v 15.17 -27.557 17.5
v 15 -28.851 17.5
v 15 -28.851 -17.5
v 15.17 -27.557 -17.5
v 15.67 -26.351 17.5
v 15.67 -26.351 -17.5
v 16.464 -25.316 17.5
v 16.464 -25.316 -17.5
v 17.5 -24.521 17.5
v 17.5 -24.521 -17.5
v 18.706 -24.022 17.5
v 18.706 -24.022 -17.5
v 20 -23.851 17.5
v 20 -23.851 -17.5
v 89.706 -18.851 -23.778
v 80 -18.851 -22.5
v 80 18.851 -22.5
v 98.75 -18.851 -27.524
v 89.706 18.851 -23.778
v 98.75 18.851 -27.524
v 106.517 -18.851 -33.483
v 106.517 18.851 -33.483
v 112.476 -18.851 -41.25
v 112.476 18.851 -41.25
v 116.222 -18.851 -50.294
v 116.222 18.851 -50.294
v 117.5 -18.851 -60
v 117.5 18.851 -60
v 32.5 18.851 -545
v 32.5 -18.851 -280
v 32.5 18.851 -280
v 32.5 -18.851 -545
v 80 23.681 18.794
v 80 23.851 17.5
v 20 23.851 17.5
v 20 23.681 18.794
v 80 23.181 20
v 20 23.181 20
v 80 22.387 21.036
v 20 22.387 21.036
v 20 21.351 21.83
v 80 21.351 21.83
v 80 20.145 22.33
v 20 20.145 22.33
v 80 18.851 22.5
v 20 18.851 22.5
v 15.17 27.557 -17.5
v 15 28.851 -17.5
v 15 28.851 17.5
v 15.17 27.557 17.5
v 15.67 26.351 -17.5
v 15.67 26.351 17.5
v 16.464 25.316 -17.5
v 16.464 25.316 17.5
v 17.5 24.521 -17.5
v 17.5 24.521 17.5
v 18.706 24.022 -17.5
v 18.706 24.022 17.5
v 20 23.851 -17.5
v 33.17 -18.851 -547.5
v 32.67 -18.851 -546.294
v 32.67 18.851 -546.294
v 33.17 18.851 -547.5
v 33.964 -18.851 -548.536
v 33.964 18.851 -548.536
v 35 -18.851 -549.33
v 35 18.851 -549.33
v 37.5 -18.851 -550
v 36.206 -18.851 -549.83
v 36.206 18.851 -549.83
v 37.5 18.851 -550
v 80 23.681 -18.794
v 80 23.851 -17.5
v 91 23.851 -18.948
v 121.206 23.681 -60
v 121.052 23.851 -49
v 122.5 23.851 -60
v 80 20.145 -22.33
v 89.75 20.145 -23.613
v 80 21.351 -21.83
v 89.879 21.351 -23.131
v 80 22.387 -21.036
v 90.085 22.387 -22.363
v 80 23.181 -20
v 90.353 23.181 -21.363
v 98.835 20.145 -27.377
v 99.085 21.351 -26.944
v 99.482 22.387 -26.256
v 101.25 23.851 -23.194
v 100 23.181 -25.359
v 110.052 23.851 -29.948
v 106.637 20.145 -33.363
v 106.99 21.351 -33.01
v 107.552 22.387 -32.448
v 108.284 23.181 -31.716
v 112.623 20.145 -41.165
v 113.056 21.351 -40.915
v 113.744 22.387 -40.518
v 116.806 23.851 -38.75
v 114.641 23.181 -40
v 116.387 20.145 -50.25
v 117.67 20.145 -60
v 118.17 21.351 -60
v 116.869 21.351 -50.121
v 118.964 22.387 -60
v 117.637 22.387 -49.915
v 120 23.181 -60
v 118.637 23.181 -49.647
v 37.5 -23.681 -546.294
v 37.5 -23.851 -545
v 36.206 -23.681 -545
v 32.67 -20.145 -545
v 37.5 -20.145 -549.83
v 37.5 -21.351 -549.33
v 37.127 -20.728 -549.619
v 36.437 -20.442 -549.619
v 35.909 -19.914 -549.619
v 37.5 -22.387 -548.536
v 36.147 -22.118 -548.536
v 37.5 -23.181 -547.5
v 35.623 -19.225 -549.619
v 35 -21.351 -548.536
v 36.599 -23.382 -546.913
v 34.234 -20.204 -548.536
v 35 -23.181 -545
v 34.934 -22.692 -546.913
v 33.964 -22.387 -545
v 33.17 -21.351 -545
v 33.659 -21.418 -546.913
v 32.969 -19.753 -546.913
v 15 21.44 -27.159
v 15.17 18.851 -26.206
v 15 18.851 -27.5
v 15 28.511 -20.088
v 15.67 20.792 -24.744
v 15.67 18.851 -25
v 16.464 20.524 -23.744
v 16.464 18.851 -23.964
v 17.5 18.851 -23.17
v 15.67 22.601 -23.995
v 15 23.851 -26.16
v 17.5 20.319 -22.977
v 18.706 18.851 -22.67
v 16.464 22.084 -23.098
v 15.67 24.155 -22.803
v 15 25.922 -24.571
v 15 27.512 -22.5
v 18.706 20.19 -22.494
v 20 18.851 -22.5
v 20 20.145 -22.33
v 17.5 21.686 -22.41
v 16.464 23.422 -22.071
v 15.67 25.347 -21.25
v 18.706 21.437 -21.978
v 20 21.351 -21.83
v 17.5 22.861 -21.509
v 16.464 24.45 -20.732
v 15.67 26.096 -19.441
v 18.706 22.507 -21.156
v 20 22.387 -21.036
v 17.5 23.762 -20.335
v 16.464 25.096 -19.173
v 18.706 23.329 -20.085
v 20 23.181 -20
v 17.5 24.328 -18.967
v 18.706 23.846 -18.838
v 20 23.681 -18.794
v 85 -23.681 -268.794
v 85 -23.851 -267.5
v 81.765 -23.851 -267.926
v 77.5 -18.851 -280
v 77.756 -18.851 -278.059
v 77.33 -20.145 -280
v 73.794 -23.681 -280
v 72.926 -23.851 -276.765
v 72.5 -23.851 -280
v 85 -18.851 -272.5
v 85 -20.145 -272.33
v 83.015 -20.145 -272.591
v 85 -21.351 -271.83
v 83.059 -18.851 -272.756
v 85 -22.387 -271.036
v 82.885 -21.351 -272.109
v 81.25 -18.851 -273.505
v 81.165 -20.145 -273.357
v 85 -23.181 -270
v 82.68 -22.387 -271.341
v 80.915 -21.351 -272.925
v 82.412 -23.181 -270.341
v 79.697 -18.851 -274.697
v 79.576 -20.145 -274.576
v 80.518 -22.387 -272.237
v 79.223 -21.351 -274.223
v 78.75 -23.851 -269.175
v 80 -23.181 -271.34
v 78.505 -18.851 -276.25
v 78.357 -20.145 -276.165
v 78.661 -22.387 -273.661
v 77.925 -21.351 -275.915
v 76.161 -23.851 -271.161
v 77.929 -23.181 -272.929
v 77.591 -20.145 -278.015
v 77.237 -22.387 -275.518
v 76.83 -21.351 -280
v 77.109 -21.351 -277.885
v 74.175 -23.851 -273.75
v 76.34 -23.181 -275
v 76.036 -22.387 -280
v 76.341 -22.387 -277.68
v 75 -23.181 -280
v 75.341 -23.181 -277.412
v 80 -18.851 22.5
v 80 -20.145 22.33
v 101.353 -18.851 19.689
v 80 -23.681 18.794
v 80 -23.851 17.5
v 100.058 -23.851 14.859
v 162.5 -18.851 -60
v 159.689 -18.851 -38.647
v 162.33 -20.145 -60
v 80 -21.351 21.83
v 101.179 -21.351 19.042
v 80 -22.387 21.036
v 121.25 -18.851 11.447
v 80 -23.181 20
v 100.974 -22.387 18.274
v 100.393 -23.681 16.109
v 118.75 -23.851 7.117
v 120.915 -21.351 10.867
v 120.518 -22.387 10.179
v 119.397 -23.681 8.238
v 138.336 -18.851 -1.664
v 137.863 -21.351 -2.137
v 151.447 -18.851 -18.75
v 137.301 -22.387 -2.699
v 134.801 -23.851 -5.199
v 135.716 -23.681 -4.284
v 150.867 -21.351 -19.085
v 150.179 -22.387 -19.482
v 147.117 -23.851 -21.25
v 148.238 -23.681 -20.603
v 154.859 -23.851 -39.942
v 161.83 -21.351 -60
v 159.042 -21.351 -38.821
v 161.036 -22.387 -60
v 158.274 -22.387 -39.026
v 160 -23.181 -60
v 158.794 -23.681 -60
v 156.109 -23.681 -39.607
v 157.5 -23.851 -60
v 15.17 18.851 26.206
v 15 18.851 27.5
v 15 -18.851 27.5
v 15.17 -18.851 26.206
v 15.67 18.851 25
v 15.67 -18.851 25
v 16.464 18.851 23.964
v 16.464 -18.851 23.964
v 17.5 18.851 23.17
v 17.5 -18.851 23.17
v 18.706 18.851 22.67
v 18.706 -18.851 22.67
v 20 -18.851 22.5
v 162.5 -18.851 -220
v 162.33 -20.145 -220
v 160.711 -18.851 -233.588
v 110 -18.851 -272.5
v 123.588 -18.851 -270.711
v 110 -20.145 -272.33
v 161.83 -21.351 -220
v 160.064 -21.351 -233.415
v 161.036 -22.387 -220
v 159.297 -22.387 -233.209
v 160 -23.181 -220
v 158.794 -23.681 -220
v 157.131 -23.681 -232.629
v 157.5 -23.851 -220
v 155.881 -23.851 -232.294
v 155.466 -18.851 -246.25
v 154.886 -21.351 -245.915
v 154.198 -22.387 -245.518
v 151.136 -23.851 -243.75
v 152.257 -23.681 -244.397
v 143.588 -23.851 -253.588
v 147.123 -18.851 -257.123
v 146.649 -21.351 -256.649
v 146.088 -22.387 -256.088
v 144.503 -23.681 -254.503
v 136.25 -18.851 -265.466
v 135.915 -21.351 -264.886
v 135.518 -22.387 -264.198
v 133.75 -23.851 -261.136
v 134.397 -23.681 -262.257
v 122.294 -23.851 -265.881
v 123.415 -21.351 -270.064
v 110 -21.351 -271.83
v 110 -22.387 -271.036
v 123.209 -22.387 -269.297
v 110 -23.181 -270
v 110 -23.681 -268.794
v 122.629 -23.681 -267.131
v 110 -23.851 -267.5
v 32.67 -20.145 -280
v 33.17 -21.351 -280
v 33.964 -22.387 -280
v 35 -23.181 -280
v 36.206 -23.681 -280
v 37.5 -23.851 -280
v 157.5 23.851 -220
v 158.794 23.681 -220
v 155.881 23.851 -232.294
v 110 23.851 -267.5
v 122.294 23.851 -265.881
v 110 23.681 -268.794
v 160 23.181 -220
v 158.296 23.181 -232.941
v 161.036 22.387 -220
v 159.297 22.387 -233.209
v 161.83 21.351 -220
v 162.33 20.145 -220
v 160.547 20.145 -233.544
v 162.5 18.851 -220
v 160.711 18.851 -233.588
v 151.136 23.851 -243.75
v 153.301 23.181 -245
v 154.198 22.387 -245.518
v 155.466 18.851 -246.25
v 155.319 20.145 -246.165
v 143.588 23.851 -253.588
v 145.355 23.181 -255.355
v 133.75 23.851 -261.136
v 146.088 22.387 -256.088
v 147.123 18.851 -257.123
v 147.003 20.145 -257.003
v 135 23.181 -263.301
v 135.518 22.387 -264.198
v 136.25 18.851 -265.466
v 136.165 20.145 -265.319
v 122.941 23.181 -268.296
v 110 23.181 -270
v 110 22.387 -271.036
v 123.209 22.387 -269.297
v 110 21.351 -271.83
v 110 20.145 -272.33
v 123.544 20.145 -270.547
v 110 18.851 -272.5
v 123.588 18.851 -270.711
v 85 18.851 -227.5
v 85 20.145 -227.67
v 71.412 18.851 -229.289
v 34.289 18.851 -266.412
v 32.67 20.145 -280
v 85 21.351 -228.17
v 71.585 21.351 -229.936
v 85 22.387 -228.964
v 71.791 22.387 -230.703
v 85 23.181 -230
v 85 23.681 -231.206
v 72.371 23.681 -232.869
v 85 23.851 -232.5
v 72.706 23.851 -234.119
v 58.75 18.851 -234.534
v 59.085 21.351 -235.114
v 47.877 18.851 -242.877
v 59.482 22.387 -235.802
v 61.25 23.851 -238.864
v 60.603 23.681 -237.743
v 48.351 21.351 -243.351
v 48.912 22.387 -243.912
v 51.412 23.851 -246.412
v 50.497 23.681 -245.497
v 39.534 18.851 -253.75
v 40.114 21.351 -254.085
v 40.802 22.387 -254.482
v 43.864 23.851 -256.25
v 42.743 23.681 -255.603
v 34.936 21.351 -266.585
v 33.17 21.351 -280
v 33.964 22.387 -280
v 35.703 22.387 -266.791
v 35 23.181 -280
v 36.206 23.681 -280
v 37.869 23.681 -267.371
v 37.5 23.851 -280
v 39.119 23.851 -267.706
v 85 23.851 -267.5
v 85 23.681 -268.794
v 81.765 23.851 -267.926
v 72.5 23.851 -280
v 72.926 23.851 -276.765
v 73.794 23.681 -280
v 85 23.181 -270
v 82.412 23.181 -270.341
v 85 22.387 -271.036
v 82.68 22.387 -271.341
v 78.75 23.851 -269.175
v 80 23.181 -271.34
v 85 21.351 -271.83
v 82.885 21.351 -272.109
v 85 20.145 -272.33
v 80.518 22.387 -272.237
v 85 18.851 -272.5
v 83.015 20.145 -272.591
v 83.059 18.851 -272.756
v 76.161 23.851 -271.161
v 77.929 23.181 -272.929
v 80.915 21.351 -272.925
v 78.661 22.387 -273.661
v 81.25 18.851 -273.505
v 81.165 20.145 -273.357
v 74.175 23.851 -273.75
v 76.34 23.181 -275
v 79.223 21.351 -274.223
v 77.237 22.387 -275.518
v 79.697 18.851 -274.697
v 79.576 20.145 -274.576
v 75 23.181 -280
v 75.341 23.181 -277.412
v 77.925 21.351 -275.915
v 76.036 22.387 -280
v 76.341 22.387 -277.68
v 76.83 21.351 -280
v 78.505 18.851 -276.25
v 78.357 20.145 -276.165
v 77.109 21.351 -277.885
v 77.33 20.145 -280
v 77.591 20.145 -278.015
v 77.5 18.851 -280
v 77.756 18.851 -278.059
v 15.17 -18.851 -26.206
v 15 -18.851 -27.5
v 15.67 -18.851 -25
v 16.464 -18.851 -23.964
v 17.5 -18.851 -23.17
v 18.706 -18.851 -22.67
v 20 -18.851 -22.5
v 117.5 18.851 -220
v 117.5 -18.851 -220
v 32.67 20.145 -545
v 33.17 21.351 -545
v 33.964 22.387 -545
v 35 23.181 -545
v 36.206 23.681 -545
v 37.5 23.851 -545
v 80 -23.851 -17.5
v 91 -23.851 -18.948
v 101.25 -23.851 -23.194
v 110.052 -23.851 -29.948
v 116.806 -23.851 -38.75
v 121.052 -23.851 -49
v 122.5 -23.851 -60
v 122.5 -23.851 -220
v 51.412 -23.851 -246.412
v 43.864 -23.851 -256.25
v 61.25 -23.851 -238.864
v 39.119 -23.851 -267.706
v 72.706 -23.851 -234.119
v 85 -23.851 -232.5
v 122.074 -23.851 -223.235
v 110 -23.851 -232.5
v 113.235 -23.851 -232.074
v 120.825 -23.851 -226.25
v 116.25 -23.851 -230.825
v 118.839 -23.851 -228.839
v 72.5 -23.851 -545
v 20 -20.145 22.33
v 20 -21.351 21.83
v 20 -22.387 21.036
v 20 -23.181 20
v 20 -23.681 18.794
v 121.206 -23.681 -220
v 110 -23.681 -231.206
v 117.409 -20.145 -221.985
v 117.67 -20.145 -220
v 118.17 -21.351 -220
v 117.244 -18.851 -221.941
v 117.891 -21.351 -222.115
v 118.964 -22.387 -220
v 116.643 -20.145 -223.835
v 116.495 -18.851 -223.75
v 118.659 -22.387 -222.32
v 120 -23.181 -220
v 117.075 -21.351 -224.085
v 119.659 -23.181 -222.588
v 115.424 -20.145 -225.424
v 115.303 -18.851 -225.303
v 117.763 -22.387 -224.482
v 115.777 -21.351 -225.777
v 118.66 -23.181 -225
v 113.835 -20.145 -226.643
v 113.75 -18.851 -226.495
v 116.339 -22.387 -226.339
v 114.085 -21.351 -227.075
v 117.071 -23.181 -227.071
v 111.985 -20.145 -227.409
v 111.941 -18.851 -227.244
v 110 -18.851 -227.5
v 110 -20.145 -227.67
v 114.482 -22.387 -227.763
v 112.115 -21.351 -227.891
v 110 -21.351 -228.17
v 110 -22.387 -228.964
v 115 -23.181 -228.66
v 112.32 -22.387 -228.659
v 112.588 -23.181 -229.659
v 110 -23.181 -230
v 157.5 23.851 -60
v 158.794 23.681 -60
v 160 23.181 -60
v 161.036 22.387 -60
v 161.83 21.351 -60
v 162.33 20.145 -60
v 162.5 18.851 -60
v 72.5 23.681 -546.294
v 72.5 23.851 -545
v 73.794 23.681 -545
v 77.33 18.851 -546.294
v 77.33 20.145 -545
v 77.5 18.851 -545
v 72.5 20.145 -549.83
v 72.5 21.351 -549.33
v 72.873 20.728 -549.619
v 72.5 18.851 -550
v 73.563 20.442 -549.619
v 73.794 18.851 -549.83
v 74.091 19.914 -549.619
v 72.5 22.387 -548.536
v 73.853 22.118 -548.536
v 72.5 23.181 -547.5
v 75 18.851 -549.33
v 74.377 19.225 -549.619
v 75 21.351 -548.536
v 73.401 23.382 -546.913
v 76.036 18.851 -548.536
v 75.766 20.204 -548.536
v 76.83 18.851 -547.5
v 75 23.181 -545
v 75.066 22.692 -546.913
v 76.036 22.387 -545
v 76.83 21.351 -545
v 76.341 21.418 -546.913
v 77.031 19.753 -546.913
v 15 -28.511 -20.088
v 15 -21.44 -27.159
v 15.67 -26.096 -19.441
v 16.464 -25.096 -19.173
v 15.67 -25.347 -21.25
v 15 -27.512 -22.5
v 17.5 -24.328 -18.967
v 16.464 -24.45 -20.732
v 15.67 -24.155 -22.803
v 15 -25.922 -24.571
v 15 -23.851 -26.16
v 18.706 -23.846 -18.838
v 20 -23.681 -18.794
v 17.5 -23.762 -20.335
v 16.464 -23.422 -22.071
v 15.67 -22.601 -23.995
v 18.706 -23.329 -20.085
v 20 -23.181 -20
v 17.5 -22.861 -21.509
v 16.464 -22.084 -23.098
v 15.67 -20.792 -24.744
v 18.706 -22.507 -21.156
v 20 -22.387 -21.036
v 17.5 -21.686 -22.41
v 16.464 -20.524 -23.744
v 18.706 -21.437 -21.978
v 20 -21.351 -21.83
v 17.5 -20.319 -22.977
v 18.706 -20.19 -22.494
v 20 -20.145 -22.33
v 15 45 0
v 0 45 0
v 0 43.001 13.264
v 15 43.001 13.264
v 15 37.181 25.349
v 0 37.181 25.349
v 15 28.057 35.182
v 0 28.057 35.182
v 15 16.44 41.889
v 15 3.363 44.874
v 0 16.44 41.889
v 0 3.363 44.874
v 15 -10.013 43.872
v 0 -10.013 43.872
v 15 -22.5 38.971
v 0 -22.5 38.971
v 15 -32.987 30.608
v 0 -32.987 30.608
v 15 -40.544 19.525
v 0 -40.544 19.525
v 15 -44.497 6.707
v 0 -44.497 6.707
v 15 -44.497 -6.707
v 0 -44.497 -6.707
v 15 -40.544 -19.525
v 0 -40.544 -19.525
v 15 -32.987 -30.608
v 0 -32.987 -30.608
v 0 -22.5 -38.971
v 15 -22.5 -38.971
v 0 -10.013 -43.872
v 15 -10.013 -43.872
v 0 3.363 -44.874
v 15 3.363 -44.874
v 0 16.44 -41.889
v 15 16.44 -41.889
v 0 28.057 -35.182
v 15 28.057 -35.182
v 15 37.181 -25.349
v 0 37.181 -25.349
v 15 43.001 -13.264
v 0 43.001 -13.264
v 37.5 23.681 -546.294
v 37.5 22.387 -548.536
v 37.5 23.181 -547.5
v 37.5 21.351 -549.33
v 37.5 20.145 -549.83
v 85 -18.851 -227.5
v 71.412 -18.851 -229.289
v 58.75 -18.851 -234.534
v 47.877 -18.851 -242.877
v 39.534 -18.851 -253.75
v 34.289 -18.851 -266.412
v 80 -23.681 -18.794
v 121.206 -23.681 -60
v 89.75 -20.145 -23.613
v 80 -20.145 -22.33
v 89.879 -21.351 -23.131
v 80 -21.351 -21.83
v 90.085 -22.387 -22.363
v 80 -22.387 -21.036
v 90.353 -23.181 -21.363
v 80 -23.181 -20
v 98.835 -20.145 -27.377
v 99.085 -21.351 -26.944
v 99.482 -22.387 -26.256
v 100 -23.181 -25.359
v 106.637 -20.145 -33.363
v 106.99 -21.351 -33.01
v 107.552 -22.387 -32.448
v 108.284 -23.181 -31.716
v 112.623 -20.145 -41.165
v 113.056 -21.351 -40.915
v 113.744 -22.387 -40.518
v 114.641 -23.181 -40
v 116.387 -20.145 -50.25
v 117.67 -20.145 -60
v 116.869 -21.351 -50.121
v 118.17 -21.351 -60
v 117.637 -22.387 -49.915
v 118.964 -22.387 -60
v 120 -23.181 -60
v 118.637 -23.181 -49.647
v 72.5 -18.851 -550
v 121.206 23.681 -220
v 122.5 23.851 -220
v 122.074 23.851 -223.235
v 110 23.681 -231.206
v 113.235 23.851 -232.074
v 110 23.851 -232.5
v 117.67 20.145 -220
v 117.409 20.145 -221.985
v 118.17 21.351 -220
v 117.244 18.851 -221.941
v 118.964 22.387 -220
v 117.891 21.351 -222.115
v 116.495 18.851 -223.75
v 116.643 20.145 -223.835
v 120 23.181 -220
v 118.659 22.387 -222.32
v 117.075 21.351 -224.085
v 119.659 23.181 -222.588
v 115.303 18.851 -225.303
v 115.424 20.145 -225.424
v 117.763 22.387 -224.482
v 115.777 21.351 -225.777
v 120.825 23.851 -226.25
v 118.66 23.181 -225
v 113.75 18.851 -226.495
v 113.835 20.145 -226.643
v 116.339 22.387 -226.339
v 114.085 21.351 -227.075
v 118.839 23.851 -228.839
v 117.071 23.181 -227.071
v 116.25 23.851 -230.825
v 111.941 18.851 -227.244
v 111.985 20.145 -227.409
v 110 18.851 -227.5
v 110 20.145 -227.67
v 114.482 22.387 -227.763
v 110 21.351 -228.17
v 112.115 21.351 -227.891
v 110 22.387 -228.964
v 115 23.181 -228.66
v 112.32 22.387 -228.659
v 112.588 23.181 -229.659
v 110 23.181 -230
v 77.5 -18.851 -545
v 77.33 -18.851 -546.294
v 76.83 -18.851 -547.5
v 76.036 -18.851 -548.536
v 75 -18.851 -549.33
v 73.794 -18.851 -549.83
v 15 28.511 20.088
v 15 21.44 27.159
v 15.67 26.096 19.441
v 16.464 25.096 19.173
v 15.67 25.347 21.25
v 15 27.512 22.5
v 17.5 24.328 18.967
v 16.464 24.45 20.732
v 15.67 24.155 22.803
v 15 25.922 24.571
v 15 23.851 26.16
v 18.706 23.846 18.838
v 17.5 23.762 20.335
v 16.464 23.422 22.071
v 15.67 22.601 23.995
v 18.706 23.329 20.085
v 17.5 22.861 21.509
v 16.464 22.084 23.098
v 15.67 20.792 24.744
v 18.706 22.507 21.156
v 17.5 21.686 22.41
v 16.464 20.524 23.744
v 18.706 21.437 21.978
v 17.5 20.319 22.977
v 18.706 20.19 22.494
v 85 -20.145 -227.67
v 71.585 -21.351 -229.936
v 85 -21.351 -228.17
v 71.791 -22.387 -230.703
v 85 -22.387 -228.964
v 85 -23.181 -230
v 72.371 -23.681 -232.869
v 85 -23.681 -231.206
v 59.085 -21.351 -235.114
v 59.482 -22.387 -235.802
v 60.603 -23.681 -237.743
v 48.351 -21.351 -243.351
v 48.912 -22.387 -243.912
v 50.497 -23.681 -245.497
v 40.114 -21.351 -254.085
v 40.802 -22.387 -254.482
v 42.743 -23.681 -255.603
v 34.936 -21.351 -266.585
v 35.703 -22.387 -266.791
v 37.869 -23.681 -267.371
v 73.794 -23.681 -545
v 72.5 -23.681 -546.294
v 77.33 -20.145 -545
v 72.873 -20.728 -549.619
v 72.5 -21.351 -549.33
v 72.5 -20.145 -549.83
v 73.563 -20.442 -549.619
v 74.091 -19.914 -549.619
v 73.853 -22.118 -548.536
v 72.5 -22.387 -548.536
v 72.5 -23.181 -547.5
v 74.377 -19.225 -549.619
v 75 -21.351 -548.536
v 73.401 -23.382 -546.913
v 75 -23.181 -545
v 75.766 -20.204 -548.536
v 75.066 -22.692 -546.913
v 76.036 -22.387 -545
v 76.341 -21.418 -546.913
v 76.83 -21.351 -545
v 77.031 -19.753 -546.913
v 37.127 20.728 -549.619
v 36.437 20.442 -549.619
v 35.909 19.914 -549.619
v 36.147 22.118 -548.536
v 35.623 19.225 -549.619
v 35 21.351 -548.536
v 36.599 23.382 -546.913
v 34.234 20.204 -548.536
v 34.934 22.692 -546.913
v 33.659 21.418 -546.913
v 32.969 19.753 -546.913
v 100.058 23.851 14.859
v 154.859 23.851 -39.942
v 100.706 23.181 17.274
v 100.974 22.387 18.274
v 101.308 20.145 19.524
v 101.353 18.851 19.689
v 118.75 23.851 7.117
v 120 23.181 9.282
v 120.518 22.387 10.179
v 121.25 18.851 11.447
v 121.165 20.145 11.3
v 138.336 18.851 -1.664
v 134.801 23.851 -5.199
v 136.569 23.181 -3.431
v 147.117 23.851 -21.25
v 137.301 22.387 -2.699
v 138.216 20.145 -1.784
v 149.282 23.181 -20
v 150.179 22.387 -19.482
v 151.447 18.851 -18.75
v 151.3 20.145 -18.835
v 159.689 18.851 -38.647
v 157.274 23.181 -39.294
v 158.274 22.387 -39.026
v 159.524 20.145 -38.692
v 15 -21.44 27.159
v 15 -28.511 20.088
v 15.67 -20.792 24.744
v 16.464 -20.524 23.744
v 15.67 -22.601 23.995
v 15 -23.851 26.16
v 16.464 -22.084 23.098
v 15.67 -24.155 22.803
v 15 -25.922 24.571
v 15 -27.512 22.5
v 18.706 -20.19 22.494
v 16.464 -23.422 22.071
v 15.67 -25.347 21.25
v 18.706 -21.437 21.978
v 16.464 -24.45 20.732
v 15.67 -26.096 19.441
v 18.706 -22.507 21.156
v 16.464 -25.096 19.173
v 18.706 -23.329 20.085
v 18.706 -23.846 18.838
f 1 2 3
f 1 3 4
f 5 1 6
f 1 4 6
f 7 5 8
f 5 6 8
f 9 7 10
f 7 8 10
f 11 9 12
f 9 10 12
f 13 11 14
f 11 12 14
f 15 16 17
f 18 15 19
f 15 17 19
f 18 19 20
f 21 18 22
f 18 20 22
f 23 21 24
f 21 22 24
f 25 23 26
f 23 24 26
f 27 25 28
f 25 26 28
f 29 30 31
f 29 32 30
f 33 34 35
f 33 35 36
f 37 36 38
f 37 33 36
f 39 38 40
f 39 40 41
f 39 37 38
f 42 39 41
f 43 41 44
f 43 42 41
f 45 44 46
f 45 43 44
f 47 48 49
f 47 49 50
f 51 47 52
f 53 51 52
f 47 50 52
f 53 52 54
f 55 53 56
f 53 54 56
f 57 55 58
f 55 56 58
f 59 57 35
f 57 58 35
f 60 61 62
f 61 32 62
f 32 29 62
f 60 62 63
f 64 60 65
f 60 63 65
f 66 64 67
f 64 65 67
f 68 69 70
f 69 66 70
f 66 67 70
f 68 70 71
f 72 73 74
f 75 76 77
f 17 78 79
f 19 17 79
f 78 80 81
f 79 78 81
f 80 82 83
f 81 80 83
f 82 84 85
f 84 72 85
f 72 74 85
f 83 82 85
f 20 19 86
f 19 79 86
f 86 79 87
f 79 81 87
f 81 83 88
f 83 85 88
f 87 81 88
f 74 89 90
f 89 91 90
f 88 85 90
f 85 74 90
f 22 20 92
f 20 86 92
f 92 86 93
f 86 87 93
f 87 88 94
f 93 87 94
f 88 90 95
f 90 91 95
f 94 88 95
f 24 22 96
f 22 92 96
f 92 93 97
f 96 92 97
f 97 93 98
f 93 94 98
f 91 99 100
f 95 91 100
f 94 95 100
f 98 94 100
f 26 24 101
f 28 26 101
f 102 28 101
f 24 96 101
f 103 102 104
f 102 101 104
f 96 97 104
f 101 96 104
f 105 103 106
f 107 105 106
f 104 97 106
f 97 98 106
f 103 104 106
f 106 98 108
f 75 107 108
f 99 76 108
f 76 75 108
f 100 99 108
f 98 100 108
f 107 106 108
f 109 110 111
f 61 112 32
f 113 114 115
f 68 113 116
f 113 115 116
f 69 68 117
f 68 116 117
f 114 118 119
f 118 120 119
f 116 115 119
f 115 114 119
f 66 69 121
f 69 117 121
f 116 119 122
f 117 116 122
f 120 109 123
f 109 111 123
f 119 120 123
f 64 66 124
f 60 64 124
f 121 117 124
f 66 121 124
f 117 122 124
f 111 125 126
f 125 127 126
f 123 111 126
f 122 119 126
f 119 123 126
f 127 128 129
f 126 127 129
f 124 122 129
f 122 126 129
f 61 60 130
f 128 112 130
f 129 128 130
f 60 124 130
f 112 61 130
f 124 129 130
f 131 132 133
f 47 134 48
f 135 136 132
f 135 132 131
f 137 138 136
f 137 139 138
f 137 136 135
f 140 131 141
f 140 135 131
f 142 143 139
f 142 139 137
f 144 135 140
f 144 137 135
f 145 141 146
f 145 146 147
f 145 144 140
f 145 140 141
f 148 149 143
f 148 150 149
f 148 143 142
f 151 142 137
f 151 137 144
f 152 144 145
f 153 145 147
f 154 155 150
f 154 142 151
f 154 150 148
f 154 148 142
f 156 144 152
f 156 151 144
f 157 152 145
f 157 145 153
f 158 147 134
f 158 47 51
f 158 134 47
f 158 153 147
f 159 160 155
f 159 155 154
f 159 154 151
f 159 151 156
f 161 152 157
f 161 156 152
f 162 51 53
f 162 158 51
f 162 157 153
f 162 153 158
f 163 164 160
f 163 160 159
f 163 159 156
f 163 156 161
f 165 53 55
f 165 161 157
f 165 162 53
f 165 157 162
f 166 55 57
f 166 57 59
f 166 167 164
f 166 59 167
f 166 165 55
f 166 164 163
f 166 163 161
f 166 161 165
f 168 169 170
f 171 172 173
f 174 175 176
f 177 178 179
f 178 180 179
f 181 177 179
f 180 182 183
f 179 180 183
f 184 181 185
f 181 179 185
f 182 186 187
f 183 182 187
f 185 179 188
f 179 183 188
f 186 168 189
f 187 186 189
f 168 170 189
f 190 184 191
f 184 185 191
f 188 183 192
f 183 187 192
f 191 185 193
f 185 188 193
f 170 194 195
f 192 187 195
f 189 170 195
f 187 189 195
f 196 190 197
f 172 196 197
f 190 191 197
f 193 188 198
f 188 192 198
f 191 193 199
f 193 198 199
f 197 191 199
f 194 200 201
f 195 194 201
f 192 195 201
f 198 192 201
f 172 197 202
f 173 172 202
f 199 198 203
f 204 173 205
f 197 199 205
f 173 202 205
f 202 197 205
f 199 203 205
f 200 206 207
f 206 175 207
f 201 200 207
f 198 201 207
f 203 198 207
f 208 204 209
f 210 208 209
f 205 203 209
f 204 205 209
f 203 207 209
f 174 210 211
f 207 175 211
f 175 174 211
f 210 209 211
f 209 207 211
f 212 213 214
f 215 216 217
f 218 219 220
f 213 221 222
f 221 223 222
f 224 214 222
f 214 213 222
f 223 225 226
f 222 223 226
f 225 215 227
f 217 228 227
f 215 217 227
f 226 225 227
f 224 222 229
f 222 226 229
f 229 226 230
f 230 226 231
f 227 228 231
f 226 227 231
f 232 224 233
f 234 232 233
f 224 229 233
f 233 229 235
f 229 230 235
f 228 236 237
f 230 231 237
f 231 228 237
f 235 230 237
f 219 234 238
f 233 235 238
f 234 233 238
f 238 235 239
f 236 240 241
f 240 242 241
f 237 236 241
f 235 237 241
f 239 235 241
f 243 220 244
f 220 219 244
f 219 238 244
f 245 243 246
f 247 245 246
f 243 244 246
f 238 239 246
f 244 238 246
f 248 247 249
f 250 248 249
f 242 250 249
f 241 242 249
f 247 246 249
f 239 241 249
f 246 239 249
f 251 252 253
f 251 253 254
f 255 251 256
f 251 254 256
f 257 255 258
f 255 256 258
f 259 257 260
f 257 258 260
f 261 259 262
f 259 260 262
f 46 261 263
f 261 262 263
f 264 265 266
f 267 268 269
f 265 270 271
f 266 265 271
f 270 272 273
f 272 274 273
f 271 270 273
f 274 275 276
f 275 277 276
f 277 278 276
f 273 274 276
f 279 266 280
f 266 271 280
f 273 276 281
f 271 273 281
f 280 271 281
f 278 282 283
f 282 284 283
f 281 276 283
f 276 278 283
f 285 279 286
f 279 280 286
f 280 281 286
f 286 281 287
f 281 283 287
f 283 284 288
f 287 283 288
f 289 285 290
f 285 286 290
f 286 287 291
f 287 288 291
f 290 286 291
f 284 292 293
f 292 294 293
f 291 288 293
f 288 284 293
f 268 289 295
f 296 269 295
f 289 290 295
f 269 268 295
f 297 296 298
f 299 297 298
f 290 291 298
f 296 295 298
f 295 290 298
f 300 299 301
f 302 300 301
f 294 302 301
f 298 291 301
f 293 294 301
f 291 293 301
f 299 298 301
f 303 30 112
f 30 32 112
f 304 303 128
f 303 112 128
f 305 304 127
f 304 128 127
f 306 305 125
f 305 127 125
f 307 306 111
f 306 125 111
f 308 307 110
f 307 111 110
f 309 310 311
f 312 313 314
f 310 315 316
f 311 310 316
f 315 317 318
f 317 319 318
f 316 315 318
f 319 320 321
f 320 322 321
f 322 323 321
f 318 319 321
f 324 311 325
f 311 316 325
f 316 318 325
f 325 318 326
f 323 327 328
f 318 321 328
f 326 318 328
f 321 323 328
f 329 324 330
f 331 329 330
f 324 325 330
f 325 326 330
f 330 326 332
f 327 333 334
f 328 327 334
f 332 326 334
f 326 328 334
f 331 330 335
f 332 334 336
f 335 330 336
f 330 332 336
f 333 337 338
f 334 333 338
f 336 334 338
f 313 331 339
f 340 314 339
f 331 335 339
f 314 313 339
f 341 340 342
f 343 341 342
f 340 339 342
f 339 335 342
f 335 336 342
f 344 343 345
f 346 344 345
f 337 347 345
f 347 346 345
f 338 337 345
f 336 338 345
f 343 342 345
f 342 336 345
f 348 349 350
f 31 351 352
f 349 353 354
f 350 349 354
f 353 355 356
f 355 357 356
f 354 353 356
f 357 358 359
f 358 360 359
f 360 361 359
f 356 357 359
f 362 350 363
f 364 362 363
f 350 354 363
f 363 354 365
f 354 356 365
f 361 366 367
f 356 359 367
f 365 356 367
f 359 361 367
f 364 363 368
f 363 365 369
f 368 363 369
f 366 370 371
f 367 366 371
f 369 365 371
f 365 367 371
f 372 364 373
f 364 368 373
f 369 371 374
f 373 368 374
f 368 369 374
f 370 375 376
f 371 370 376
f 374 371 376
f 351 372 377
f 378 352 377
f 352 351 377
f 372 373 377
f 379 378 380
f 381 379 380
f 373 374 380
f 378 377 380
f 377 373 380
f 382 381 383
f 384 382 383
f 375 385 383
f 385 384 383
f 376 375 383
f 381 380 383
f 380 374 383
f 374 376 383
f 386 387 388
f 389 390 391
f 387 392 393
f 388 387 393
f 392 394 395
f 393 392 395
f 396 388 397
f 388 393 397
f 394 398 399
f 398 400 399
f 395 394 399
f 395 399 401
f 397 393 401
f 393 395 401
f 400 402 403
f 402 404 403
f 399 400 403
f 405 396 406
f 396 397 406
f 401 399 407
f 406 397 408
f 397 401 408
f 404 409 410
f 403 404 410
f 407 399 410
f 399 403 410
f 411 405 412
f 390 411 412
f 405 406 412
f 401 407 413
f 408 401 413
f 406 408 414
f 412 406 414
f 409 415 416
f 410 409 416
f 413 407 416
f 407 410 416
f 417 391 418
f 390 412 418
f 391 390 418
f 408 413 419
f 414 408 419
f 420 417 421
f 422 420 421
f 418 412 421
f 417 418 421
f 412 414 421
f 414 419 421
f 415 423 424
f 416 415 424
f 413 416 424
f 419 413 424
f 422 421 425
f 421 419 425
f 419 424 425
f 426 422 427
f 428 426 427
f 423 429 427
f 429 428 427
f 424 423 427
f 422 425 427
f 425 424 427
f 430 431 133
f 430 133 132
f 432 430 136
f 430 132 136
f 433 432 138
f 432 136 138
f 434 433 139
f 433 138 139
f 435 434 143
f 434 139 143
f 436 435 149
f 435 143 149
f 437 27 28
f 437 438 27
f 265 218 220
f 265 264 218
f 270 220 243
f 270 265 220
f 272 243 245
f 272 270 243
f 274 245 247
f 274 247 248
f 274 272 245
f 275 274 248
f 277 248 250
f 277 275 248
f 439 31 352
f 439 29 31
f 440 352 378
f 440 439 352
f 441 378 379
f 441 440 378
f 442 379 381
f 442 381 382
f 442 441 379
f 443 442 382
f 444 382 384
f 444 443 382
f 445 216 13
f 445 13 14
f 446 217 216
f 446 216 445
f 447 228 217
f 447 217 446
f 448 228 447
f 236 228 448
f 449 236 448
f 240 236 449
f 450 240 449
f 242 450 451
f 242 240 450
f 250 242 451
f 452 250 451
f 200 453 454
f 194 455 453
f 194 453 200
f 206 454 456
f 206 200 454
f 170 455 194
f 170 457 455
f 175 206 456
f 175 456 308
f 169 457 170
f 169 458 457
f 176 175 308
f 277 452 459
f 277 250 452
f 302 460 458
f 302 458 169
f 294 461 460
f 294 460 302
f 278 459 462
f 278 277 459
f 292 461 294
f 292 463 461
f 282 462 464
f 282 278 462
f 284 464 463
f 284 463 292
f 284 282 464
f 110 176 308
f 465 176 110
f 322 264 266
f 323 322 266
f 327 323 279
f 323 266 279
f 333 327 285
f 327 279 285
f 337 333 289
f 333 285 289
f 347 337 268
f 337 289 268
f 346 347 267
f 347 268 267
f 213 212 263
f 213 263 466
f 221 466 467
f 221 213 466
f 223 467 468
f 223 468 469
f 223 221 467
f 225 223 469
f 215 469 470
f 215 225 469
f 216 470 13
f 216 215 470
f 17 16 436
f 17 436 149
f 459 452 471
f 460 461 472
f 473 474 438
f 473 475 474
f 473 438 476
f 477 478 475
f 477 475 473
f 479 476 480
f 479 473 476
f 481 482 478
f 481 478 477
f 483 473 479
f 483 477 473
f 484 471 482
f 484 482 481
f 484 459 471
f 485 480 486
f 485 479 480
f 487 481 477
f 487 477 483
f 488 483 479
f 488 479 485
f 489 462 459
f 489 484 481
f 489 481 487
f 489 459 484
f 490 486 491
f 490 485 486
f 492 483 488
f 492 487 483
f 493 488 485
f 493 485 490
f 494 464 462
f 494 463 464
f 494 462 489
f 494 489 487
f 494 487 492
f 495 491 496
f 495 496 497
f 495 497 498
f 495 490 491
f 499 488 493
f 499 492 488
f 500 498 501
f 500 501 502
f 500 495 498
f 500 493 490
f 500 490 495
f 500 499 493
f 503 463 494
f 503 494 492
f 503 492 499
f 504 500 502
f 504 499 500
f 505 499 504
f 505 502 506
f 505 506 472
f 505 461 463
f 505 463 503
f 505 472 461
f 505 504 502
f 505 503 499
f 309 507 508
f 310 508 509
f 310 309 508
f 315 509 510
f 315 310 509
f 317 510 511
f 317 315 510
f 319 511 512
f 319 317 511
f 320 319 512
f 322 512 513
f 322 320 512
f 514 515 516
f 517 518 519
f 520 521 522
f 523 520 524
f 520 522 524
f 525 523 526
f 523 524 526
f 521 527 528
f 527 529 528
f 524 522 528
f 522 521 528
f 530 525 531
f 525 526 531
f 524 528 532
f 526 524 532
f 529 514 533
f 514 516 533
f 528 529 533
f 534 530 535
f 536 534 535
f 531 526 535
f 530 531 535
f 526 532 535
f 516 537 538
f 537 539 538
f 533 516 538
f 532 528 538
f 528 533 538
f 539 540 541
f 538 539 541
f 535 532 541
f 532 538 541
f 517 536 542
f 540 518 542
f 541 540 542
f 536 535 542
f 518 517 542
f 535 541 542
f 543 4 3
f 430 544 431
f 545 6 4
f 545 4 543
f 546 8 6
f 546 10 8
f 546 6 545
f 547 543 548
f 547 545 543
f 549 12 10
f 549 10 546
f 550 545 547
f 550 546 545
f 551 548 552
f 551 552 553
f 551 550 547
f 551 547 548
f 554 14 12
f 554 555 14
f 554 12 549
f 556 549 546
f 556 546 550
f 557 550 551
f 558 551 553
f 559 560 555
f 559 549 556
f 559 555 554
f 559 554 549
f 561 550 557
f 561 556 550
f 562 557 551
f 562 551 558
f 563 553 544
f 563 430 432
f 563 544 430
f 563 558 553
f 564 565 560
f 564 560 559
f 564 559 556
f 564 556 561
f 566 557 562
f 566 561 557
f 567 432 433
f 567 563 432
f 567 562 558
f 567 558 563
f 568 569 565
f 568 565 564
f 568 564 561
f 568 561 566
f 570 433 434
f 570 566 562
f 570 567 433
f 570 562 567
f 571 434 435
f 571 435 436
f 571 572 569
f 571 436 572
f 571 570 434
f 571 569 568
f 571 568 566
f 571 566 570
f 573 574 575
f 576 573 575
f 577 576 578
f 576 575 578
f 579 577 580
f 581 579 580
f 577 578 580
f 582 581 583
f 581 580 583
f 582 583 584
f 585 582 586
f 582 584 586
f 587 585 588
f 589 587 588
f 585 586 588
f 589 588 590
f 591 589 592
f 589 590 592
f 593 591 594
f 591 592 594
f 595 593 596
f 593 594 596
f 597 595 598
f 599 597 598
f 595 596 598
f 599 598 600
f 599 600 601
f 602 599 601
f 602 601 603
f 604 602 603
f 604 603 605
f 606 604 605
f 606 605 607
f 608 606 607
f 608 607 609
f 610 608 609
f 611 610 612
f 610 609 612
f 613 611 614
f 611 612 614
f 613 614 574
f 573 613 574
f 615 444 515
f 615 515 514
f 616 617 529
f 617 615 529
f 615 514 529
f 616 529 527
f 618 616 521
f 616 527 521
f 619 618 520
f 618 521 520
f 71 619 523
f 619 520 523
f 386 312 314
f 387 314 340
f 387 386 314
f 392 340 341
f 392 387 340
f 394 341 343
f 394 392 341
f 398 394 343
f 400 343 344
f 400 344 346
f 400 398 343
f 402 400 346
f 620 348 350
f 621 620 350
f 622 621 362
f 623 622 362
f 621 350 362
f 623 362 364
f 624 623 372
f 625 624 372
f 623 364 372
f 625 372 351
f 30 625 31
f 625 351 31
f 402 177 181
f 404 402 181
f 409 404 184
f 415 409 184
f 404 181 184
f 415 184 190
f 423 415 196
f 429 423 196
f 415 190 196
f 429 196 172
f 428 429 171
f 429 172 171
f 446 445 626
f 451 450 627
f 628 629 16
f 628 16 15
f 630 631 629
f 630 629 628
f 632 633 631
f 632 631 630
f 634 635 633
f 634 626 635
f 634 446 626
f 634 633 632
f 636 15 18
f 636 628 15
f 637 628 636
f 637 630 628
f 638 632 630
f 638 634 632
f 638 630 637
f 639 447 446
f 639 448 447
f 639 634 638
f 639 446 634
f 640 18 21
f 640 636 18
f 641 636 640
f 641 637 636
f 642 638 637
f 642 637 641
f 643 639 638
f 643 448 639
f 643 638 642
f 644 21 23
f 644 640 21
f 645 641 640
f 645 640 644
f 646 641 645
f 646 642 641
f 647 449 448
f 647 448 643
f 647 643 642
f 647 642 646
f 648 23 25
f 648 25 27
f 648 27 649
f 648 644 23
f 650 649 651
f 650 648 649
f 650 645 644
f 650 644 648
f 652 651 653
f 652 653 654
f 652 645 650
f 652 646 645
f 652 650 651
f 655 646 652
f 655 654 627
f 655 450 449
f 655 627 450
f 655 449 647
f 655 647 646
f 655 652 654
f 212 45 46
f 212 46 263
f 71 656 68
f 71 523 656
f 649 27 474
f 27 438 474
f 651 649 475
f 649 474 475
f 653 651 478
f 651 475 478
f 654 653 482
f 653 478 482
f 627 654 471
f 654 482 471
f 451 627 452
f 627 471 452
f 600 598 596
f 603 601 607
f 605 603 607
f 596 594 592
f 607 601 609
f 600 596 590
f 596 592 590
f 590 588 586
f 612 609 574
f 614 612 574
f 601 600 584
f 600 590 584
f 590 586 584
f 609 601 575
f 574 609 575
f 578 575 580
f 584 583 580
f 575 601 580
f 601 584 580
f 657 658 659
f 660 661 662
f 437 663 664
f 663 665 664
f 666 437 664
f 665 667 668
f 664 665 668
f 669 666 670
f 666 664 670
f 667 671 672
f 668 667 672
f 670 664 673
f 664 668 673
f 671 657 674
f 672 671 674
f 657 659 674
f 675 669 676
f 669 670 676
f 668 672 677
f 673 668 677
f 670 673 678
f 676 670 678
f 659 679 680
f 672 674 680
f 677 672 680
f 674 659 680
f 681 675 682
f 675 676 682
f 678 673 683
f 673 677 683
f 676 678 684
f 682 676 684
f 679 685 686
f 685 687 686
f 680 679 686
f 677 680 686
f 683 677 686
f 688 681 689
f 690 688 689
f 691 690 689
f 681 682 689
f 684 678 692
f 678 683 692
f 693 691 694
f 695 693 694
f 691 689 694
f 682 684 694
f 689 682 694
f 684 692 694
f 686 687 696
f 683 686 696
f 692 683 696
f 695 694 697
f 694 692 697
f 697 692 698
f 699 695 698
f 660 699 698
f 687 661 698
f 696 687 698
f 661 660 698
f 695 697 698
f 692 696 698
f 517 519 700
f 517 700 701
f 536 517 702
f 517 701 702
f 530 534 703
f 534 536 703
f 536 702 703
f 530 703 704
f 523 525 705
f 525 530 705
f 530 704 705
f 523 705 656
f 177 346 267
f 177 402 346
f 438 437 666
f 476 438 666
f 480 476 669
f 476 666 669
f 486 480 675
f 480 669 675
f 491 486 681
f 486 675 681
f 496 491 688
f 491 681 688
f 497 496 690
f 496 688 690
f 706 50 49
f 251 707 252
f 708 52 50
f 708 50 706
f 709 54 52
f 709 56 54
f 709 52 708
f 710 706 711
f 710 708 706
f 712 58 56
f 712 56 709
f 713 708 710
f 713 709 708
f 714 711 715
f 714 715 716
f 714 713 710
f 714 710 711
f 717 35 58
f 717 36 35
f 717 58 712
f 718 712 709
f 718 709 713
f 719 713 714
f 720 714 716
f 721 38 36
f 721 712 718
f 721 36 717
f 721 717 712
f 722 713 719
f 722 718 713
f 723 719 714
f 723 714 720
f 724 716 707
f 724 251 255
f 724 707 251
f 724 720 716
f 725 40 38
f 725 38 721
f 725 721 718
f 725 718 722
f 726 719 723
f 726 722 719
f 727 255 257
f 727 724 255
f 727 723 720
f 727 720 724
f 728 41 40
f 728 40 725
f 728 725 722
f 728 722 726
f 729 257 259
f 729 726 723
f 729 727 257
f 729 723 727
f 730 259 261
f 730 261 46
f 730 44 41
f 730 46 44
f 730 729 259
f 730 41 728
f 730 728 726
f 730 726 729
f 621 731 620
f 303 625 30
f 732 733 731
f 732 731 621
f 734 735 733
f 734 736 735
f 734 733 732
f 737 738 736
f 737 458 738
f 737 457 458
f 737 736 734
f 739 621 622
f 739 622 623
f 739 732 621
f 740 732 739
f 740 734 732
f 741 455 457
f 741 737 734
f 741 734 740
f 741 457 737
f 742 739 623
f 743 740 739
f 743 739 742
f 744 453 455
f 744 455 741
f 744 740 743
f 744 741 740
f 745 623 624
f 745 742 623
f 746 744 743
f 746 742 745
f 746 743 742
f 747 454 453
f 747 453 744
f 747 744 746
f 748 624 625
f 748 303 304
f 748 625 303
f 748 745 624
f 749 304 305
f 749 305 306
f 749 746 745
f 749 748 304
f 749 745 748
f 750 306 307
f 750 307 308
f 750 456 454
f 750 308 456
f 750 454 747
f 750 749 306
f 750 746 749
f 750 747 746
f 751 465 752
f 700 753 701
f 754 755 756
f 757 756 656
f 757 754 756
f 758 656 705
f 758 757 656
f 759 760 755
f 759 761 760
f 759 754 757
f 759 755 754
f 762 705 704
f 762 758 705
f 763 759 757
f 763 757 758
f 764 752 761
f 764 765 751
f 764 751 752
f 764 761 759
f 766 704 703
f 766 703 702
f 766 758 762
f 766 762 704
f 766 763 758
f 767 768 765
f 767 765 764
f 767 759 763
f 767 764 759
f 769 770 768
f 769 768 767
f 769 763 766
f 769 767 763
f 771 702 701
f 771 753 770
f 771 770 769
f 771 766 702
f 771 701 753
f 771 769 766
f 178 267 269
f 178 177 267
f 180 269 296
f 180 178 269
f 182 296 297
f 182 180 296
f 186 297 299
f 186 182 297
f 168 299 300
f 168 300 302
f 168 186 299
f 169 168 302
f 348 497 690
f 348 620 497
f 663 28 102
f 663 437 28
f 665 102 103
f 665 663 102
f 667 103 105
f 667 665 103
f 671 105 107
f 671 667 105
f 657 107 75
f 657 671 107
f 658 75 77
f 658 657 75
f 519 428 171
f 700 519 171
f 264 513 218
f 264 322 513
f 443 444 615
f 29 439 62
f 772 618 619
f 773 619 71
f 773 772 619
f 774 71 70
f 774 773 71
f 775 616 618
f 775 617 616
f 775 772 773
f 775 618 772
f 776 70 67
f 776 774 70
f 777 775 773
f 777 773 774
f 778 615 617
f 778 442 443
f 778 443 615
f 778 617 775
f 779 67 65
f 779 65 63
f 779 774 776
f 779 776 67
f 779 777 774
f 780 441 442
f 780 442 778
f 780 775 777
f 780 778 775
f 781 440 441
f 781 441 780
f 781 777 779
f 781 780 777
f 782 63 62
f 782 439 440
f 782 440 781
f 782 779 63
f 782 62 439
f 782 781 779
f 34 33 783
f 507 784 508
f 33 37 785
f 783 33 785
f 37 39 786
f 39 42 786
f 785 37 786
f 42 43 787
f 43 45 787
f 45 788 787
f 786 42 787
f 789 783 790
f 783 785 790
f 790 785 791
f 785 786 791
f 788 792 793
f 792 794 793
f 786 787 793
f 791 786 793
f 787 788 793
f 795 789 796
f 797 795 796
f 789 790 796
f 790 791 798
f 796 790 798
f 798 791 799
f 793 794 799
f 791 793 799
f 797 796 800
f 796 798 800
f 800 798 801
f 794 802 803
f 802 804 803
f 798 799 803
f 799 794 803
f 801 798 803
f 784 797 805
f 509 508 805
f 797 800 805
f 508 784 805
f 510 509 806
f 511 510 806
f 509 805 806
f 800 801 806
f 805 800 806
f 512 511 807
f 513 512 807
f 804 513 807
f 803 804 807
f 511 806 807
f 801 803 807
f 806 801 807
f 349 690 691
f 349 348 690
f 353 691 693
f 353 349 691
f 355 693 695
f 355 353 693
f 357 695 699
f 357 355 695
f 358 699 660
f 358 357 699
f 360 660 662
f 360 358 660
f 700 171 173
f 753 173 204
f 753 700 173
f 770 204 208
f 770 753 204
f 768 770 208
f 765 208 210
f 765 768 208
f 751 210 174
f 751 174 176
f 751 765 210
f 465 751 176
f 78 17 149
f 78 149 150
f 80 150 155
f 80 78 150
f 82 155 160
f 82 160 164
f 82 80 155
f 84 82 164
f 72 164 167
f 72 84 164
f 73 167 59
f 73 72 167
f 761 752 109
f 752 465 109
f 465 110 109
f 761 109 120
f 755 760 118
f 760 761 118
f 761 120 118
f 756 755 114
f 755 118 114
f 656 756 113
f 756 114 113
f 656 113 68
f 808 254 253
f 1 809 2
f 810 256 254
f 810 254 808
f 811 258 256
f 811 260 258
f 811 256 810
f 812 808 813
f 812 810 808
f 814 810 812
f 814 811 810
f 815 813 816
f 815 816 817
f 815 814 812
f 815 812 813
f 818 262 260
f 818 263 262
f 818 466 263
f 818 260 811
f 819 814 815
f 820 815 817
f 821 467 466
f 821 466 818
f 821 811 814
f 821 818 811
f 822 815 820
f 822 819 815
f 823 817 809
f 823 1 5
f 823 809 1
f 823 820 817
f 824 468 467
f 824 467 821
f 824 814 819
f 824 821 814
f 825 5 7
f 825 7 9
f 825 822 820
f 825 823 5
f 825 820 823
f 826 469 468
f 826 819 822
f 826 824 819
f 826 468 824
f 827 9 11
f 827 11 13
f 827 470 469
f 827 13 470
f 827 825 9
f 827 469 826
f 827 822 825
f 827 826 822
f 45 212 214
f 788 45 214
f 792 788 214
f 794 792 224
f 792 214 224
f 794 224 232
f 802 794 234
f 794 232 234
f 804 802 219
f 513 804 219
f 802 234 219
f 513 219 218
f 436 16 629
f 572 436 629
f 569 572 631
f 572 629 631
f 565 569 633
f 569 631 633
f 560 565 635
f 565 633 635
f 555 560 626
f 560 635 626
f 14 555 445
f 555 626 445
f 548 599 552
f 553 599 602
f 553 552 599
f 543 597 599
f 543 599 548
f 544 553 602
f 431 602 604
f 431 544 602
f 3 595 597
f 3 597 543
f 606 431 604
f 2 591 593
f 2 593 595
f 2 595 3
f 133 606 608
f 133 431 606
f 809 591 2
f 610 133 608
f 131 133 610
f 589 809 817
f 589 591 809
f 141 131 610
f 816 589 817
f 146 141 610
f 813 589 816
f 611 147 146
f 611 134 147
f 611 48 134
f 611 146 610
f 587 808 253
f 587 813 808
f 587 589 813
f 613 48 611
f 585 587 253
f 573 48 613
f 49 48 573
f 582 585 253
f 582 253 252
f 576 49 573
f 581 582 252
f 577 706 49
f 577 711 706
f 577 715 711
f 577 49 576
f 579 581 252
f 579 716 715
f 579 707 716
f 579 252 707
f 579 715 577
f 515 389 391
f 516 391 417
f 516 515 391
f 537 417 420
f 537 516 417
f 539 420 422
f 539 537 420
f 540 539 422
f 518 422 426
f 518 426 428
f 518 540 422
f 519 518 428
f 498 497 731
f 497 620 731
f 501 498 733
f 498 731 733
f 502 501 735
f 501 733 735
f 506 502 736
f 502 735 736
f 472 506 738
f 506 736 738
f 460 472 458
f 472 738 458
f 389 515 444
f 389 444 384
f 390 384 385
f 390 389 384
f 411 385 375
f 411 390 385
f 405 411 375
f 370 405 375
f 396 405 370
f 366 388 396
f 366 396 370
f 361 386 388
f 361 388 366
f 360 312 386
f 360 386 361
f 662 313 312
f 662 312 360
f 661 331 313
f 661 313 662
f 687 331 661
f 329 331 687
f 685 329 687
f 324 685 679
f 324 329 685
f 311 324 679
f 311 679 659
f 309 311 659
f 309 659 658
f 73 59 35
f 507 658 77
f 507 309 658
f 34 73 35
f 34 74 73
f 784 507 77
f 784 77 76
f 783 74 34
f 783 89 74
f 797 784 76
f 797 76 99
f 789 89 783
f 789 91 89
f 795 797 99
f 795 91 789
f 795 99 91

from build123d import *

# Parameters (mm, degrees)
F0_R     = 45
F1_DEPTH = 15
F2_W     = 47.7026963846
F2_H     = 45
F5_F1_R  = 5
F5_F2_R  = 5


with BuildPart() as f1:
    # F0 (on Right) → F1 (new body)
    with BuildSketch(Plane.YZ):
        Circle(F0_R)
    extrude(amount=F1_DEPTH)

    # F4: sweep along a path in F3
    with BuildLine(Plane.XZ) as f4_path:
        Line((15, 0), (80, 0))
        ThreePointArc((80, 0), (122.4264068712, -17.5735931288), (140, -60))
        Line((140, -60), (140, -220))
        ThreePointArc((140, -220), (131.2132034356, -241.2132034356), (110, -250))
        Line((110, -250), (85, -250))
        ThreePointArc((85, -250), (63.7867965644, -258.7867965644), (55, -280))
        Line((55, -280), (55, -550))
    # F2 (on face) → F4 (sweep)
    with BuildSketch(Plane.YZ.offset(15)):
        Rectangle(F2_W, F2_H)
    sweep(path=f4_path.line)

    # F5: fillet of radius 5 on 34 edges, made by hand

    # F5_f1
    f5_f1_edges = [f1.edges().sort_by_distance(p)[0] for p in [
        (47.5, -23.8513481923, 22.5),
        (47.5, -23.8513481923, -22.5),
        (106.5165042945, -23.8513481923, -33.4834957055),
        (117.5, -23.8513481923, -140),
        (115.3033008589, -23.8513481923, -225.3033008589),
        (97.5, -23.8513481923, -227.5),
        (47.8768939877, -23.8513481923, -242.8768939877),
        (32.5, -23.8513481923, -415),
        (55, -23.8513481923, -550),
        (77.5, -23.8513481923, -415),
        (79.6966991411, -23.8513481923, -274.6966991411),
        (97.5, -23.8513481923, -272.5),
        (147.1231060123, -23.8513481923, -257.1231060123),
        (162.5, -23.8513481923, -140),
        (138.3363094479, -23.8513481923, -1.6636905521),
        (47.5, 23.8513481923, -22.5),
        (47.5, 23.8513481923, 22.5),
        (138.3363094479, 23.8513481923, -1.6636905521),
        (162.5, 23.8513481923, -140),
        (147.1231060123, 23.8513481923, -257.1231060123),
        (97.5, 23.8513481923, -272.5),
        (79.6966991411, 23.8513481923, -274.6966991411),
        (77.5, 23.8513481923, -415),
        (55, 23.8513481923, -550),
        (32.5, 23.8513481923, -415),
        (47.8768939877, 23.8513481923, -242.8768939877),
        (97.5, 23.8513481923, -227.5),
        (115.3033008589, 23.8513481923, -225.3033008589),
        (117.5, 23.8513481923, -140),
        (106.5165042945, 23.8513481923, -33.4834957055),
        (32.5, 0, -550),
        (77.5, 0, -550),
    ]]
    fillet(f5_f1_edges, radius=F5_F1_R)

    # F5_f2
    f5_f2_edges = [f1.edges().sort_by_distance(p)[0] for p in [
        (15, -23.8513481923, 0),
        (15, 23.8513481923, 0),
        (15, 22.3868820983, -21.0355339059),
        (15, 22.3868820983, 21.0355339059),
        (15, -22.3868820983, 21.0355339059),
        (15, -22.3868820983, -21.0355339059),
    ]]
    fillet(f5_f2_edges, radius=F5_F2_R)


solid = f1.part
